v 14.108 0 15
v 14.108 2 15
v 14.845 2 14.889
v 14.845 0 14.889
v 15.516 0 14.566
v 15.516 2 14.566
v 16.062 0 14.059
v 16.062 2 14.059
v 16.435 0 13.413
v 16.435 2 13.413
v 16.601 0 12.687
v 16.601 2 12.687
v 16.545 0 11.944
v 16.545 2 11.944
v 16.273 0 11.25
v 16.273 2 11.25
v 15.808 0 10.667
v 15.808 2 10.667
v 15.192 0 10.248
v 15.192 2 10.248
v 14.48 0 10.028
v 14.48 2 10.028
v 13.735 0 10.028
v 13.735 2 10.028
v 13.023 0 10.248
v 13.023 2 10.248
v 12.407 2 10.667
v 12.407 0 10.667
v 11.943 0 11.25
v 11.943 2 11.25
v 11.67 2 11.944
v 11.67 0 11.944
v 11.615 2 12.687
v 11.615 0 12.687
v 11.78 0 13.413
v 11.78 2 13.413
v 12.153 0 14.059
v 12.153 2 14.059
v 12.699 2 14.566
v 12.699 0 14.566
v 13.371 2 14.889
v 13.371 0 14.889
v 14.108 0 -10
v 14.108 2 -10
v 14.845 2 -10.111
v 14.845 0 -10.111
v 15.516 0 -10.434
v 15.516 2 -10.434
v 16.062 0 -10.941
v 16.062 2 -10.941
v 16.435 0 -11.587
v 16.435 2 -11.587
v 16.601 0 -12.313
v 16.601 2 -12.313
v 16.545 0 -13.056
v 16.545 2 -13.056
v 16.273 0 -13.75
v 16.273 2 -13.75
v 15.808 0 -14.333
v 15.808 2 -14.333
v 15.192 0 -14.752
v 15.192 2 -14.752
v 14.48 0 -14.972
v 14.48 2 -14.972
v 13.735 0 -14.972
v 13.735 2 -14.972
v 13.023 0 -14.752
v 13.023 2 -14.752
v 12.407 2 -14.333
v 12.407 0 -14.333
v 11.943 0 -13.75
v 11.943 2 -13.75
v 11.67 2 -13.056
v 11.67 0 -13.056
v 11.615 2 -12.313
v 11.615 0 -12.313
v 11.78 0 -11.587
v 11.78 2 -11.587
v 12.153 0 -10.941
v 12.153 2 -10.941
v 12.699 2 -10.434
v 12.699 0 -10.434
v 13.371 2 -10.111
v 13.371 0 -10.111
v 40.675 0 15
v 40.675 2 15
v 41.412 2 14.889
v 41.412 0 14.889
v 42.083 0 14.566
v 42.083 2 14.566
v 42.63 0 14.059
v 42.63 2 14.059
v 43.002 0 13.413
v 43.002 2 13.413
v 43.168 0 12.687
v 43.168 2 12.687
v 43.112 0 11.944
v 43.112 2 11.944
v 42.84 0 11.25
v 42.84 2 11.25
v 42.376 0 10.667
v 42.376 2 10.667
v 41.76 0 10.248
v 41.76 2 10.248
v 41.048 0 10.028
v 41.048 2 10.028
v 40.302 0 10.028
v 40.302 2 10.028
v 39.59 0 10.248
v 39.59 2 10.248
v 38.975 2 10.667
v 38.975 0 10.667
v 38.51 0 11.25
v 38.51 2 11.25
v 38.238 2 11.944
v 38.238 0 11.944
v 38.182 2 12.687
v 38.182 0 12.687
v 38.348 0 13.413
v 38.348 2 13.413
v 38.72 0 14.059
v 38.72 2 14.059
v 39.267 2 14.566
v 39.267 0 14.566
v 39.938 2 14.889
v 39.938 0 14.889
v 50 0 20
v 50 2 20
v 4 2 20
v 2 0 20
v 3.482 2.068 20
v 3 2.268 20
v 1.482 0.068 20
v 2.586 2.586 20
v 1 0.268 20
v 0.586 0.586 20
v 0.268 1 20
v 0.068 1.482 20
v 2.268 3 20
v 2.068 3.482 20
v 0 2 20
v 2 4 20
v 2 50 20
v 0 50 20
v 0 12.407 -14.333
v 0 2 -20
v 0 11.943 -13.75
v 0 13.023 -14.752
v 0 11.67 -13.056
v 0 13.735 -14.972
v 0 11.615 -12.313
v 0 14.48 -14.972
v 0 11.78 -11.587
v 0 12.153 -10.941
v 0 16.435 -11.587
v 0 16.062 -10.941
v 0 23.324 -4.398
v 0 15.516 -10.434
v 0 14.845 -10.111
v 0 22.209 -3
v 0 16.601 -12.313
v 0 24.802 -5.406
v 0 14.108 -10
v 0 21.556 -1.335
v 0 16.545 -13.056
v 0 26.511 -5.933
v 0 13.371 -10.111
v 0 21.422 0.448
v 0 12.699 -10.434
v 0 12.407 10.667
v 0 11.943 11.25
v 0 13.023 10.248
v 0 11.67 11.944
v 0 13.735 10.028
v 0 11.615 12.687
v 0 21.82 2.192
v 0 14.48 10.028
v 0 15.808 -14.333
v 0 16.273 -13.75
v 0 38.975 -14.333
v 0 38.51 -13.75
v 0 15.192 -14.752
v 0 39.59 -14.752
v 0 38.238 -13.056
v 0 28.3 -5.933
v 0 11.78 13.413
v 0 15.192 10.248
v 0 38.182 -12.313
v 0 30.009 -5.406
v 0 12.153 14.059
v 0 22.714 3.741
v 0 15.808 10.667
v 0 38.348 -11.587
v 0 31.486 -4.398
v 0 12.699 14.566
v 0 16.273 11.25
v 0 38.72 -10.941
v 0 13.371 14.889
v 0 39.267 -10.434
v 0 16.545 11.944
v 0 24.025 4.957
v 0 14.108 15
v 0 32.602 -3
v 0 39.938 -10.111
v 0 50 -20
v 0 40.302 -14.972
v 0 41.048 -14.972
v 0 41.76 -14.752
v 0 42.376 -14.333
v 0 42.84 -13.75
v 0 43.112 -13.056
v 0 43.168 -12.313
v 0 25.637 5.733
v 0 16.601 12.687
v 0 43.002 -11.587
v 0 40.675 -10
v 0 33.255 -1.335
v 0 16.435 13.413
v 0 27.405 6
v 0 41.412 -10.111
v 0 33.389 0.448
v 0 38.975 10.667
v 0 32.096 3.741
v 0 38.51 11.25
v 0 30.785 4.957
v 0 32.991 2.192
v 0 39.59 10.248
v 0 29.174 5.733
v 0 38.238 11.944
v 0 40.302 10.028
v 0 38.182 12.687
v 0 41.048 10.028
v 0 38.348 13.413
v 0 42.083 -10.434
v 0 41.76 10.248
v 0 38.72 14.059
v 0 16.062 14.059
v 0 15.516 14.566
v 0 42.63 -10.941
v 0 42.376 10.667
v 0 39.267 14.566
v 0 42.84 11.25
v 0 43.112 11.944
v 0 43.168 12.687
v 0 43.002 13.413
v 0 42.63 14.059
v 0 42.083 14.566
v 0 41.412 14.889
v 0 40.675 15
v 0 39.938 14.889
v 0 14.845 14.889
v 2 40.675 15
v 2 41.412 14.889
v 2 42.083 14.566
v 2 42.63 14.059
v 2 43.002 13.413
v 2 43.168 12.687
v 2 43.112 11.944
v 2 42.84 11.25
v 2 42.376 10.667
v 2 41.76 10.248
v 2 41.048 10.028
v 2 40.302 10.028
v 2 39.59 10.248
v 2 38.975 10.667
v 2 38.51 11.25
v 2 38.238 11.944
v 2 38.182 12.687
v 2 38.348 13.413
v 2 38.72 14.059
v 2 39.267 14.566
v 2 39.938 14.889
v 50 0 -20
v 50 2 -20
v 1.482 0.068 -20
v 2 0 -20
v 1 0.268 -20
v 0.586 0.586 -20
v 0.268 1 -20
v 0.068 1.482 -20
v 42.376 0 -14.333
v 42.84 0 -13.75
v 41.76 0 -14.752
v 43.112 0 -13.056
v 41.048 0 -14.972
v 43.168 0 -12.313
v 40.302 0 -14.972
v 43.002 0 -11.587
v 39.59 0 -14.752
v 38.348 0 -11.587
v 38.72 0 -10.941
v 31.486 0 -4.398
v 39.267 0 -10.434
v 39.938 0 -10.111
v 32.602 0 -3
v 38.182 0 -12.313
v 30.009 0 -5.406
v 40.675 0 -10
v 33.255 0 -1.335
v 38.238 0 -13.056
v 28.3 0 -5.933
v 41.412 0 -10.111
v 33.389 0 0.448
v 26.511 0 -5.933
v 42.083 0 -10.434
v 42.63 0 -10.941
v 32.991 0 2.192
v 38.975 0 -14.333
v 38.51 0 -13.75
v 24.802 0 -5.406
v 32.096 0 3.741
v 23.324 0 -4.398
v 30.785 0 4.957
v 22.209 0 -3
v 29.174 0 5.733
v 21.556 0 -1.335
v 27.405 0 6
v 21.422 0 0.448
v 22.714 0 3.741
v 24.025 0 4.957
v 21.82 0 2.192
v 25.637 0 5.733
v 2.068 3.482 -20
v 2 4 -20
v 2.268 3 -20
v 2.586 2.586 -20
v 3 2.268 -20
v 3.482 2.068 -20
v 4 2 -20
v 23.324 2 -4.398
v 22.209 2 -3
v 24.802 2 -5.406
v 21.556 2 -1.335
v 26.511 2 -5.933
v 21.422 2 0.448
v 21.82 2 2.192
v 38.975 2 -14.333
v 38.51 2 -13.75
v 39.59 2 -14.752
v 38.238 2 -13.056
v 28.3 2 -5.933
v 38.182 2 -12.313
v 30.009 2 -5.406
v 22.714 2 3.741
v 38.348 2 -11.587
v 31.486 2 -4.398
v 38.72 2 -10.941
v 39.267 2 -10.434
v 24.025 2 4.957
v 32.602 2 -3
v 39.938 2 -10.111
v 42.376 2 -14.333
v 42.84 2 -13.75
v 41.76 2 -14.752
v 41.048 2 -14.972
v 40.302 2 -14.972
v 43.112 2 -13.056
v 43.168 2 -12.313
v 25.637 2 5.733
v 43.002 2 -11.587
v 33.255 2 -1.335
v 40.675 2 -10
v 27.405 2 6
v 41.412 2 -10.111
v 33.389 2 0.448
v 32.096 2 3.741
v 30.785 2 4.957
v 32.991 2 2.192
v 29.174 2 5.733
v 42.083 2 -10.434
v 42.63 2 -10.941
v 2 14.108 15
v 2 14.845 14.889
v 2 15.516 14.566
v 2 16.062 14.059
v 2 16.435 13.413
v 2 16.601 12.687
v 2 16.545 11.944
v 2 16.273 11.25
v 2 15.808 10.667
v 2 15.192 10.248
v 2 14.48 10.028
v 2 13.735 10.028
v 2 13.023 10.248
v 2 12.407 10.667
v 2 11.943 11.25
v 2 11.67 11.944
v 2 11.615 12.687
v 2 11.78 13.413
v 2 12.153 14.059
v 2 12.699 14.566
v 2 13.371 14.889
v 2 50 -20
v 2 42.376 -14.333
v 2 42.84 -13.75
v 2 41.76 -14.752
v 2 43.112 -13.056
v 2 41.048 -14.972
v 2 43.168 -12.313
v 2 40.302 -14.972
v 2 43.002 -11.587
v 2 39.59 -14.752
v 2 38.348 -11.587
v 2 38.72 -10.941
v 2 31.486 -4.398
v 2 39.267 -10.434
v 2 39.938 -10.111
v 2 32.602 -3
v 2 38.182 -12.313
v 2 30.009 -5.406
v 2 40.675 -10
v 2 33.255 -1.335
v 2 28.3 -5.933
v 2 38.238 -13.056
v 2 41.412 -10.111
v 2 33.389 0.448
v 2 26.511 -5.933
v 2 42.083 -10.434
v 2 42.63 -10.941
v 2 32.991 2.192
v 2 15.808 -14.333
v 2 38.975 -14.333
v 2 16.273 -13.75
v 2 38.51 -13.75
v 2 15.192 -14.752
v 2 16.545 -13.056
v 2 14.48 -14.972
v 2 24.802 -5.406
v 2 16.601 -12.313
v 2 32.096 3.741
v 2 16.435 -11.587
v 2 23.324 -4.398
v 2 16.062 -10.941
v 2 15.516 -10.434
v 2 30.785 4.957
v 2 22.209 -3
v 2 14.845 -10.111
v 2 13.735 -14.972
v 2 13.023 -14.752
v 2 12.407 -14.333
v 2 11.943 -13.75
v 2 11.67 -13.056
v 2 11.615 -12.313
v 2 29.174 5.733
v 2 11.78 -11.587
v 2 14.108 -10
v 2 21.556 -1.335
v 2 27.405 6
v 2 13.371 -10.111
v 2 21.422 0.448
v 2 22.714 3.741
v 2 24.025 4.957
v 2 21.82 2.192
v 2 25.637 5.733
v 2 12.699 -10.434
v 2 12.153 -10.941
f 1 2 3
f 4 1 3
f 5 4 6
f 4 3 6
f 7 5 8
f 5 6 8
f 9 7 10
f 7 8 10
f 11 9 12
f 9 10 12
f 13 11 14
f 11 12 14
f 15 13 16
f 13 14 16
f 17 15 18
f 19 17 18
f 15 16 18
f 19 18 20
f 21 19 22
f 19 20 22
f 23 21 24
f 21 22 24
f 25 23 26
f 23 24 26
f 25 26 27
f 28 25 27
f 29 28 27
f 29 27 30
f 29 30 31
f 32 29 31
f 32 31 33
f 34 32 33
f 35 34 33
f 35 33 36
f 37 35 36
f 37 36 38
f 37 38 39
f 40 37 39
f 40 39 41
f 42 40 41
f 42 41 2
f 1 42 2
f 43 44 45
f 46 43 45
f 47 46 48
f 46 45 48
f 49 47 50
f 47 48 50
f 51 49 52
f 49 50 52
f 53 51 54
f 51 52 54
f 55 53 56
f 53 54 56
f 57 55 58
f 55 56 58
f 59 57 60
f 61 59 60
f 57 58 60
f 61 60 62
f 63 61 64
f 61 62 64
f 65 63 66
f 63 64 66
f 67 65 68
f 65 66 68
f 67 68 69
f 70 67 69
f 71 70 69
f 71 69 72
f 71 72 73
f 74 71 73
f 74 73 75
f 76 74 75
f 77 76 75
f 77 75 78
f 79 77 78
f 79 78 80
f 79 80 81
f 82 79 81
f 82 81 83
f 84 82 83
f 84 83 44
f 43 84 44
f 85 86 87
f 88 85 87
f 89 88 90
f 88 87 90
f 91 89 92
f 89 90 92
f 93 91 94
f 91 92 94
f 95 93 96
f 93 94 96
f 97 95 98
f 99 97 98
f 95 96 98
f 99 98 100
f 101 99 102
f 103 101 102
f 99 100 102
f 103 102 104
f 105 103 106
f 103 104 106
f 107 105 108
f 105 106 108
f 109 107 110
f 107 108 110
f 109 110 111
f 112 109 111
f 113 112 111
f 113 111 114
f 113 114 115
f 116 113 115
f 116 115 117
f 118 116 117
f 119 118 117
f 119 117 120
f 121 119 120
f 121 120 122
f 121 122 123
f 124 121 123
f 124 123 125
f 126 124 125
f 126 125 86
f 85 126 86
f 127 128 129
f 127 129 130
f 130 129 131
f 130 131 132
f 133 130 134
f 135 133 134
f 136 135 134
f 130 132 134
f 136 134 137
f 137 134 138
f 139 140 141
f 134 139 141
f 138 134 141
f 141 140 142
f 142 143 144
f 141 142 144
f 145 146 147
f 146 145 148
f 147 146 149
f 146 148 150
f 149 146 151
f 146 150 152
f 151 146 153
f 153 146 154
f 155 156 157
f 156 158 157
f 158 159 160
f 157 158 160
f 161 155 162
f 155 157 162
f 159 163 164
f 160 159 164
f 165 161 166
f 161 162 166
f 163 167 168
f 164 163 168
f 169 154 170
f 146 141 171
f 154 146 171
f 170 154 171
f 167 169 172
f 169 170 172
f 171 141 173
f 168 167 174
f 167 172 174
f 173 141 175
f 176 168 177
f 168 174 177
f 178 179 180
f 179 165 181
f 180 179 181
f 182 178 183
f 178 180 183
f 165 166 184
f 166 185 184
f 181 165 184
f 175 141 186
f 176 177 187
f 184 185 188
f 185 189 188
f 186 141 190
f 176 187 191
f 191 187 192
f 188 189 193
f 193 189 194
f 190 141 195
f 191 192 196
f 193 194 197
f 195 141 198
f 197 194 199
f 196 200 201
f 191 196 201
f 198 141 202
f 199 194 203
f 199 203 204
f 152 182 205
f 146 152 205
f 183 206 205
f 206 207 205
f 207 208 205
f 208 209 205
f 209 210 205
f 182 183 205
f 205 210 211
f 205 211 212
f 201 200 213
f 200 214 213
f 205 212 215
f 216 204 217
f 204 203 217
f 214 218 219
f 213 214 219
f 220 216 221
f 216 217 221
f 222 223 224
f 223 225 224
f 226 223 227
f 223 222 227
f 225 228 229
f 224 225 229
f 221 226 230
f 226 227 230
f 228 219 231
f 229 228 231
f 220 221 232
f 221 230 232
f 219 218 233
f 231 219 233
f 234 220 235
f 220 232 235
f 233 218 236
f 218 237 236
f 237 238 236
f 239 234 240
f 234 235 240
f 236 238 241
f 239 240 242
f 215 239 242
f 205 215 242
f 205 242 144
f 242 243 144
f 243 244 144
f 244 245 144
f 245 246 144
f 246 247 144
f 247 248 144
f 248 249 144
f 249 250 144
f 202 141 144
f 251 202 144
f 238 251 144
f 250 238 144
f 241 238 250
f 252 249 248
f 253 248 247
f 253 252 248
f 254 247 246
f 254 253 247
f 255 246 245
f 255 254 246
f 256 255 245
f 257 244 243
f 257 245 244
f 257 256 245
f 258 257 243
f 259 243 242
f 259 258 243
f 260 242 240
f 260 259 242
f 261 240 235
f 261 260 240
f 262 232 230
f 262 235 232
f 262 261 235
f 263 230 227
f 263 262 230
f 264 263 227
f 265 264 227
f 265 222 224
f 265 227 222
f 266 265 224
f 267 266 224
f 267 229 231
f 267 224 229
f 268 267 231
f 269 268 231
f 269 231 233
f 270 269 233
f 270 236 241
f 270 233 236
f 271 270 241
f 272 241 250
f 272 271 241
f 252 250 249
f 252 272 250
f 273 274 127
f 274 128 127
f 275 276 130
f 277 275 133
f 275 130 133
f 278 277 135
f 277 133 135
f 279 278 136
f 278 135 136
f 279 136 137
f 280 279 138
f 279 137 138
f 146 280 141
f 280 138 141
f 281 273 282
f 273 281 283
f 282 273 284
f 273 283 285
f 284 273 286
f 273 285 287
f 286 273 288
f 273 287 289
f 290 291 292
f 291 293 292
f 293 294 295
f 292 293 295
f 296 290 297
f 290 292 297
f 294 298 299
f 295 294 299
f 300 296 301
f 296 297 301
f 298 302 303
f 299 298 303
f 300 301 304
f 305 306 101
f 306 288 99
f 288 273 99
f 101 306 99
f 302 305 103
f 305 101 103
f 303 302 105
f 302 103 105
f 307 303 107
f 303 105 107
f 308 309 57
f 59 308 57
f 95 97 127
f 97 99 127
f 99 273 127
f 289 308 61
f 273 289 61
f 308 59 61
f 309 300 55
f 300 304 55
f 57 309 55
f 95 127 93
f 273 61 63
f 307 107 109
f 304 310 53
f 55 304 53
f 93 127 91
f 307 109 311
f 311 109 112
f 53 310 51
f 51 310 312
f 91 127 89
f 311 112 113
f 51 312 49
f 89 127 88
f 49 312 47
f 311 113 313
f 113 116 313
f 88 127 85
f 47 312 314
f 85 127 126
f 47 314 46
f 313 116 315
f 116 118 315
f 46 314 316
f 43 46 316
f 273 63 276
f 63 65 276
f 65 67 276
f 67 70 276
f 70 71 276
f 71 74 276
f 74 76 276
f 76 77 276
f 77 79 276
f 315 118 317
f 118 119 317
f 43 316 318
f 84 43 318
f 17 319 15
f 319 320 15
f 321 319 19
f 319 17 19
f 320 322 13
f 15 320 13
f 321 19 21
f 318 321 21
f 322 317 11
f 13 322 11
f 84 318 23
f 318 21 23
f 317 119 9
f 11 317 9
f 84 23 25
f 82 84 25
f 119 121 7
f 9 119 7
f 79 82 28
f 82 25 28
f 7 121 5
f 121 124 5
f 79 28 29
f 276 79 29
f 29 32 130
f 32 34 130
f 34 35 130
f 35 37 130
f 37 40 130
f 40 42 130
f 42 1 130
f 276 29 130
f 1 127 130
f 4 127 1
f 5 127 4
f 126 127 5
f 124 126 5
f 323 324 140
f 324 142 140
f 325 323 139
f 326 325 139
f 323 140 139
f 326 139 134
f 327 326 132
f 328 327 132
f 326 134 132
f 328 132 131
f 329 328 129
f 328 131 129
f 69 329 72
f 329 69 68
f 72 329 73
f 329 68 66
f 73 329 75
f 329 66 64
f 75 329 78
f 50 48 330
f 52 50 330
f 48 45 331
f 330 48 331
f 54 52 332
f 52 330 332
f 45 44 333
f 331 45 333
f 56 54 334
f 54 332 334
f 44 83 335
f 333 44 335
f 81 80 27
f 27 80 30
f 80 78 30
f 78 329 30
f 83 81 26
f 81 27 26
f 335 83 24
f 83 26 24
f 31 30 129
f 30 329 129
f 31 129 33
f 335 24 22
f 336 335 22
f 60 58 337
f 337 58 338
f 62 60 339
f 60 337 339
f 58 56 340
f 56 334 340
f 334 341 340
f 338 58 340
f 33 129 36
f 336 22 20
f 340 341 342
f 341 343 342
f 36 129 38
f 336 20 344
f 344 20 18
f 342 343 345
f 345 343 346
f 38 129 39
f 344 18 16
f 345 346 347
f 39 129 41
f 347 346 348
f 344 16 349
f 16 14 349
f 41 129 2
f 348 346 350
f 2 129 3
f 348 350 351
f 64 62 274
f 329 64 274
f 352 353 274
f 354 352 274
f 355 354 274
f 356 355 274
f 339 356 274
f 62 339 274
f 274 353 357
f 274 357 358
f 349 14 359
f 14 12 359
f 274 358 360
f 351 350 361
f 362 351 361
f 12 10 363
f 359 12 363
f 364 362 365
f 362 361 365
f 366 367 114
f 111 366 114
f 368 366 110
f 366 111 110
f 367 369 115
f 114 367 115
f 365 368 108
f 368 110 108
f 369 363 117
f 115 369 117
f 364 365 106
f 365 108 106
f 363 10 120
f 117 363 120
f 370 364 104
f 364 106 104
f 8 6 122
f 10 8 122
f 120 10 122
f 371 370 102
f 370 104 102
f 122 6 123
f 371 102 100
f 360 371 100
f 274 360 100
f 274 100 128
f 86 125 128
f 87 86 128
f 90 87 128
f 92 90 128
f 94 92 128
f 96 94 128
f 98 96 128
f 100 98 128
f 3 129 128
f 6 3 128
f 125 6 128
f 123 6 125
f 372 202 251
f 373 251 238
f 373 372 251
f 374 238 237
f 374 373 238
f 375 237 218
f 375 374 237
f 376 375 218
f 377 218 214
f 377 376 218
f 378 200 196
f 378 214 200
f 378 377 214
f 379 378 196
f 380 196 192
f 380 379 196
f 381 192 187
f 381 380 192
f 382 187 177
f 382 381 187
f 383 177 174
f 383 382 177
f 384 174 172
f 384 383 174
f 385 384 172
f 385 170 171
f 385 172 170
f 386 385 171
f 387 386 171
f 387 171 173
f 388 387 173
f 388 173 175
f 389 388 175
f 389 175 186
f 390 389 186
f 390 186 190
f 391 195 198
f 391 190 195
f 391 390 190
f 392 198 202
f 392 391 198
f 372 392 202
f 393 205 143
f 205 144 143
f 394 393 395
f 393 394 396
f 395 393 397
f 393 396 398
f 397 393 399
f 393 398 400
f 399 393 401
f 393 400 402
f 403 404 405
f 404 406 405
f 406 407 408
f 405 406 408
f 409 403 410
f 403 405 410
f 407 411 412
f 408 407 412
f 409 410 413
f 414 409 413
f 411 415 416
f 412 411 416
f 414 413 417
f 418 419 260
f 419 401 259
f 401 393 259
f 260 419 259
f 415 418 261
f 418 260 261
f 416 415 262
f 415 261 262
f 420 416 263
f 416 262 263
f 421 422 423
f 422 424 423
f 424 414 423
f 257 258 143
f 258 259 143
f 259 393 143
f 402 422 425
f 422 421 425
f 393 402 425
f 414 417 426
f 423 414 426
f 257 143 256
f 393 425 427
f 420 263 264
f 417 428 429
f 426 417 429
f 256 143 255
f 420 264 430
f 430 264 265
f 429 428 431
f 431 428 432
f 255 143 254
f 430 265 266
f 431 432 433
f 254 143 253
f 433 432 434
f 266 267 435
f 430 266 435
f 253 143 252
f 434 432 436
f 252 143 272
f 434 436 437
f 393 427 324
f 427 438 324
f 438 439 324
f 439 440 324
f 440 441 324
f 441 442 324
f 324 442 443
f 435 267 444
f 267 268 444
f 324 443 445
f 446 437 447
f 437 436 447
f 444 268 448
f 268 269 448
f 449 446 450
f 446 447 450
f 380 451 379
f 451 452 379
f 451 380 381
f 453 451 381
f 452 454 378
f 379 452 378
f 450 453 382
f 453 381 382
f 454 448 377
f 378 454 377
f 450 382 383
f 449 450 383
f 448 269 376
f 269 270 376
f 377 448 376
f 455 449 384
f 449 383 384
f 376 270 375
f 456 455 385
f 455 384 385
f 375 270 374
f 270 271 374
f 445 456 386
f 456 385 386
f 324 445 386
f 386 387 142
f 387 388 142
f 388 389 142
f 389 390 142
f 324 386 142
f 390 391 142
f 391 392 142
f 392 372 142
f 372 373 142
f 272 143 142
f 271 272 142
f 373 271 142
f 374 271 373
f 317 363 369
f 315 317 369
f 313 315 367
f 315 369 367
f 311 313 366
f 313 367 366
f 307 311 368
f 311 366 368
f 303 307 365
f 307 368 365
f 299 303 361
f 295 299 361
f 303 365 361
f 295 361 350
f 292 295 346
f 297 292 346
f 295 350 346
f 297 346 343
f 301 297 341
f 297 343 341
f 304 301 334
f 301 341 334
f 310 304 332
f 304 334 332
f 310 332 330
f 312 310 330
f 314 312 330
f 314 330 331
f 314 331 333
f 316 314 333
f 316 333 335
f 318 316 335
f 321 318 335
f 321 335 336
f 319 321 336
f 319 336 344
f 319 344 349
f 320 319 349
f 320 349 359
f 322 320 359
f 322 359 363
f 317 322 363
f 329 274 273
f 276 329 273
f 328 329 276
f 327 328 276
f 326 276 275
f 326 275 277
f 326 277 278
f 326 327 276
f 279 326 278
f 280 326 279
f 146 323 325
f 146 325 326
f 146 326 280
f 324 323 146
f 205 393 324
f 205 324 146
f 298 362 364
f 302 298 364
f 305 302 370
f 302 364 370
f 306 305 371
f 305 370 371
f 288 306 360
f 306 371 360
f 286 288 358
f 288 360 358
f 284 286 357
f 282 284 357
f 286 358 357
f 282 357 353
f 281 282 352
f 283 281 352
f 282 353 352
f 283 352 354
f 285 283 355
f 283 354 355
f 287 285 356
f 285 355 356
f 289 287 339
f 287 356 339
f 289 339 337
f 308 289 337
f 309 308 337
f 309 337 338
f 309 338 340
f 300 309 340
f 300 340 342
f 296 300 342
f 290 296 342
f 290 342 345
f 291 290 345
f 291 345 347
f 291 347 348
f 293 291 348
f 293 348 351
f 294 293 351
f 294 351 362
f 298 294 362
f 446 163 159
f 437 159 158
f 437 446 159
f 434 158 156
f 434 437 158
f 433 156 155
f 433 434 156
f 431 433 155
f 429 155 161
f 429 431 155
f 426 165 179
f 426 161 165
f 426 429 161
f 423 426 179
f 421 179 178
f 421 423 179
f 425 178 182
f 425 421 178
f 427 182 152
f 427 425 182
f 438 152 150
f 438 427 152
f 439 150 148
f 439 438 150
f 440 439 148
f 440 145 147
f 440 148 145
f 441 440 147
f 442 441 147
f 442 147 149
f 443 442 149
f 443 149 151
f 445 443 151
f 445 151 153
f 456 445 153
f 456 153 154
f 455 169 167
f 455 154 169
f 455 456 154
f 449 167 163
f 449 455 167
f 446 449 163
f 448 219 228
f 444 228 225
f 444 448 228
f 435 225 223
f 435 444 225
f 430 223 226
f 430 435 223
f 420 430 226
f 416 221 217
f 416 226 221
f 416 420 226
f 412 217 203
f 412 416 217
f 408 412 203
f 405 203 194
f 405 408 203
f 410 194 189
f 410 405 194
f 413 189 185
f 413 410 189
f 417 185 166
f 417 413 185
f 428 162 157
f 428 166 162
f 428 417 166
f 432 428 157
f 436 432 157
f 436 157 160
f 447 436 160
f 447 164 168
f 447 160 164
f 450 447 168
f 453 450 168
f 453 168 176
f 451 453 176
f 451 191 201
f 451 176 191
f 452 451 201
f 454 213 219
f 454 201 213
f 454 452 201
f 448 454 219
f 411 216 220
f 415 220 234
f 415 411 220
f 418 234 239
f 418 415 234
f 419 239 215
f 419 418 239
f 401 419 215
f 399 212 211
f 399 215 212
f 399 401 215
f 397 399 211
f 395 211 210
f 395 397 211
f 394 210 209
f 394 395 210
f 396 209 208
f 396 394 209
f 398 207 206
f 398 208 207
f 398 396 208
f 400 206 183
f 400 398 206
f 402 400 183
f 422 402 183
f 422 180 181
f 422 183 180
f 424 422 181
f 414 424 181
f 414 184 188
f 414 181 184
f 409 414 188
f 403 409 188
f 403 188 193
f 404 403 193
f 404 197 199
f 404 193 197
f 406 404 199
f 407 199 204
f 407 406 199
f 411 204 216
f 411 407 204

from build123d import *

# Parameters (mm, degrees)
BOSS_EXTRUDE1_DEPTH = 20
SKETCH3_R           = 6
SKETCH3_R_2         = 2.5
CUT_EXTRUDE1_DEPTH  = 40


with BuildPart() as part:
    # Sketch1 → Boss-Extrude1 (new, symmetric)
    with BuildSketch(Plane.XY):
        with BuildLine():
            Line((0, 2), (0, 50))
            Line((0, 50), (2, 50))
            Line((2, 50), (2, 4))
            ThreePointArc((2, 4), (2.585786438, 2.585786438), (4, 2))
            Line((4, 2), (50, 2))
            Line((50, 2), (50, 0))
            Line((50, 0), (2, 0))
            ThreePointArc((2, 0), (0.585786438, 0.585786438), (0, 2))
        make_face()
    extrude(amount=BOSS_EXTRUDE1_DEPTH, both=True)

    # Sketch3 → Cut-Extrude1 (cut)
    with BuildSketch(Plane(origin=(0, 2, 0), x_dir=(1, 0, 0), z_dir=(0, 1, 0))):
        with Locations(Location((27.405417893, 0, 0), (0, 0, 270))):
            Circle(SKETCH3_R)
        with Locations(Location((40.675078118, 12.5, 0), (0, 0, 270))):
            Circle(SKETCH3_R_2)
        with Locations(Location((40.675078118, -12.5, 0), (0, 0, 270))):
            Circle(SKETCH3_R_2)
        with Locations(Location((14.107643981, -12.5, 0), (0, 0, 270))):
            Circle(SKETCH3_R_2)
        with Locations(Location((14.107643981, 12.5, 0), (0, 0, 270))):
            Circle(SKETCH3_R_2)
    cut_extrude1 = extrude(amount=-CUT_EXTRUDE1_DEPTH, mode=Mode.SUBTRACT)

    # Mirror1: Cut-Extrude1 across plane
    add(cut_extrude1.mirror(Plane(origin=(0, 0, 0), x_dir=(0, 0, 1), z_dir=(-0.7071067811865488, 0.7071067811865464, 0))), mode=Mode.SUBTRACT)


solid = part.part
